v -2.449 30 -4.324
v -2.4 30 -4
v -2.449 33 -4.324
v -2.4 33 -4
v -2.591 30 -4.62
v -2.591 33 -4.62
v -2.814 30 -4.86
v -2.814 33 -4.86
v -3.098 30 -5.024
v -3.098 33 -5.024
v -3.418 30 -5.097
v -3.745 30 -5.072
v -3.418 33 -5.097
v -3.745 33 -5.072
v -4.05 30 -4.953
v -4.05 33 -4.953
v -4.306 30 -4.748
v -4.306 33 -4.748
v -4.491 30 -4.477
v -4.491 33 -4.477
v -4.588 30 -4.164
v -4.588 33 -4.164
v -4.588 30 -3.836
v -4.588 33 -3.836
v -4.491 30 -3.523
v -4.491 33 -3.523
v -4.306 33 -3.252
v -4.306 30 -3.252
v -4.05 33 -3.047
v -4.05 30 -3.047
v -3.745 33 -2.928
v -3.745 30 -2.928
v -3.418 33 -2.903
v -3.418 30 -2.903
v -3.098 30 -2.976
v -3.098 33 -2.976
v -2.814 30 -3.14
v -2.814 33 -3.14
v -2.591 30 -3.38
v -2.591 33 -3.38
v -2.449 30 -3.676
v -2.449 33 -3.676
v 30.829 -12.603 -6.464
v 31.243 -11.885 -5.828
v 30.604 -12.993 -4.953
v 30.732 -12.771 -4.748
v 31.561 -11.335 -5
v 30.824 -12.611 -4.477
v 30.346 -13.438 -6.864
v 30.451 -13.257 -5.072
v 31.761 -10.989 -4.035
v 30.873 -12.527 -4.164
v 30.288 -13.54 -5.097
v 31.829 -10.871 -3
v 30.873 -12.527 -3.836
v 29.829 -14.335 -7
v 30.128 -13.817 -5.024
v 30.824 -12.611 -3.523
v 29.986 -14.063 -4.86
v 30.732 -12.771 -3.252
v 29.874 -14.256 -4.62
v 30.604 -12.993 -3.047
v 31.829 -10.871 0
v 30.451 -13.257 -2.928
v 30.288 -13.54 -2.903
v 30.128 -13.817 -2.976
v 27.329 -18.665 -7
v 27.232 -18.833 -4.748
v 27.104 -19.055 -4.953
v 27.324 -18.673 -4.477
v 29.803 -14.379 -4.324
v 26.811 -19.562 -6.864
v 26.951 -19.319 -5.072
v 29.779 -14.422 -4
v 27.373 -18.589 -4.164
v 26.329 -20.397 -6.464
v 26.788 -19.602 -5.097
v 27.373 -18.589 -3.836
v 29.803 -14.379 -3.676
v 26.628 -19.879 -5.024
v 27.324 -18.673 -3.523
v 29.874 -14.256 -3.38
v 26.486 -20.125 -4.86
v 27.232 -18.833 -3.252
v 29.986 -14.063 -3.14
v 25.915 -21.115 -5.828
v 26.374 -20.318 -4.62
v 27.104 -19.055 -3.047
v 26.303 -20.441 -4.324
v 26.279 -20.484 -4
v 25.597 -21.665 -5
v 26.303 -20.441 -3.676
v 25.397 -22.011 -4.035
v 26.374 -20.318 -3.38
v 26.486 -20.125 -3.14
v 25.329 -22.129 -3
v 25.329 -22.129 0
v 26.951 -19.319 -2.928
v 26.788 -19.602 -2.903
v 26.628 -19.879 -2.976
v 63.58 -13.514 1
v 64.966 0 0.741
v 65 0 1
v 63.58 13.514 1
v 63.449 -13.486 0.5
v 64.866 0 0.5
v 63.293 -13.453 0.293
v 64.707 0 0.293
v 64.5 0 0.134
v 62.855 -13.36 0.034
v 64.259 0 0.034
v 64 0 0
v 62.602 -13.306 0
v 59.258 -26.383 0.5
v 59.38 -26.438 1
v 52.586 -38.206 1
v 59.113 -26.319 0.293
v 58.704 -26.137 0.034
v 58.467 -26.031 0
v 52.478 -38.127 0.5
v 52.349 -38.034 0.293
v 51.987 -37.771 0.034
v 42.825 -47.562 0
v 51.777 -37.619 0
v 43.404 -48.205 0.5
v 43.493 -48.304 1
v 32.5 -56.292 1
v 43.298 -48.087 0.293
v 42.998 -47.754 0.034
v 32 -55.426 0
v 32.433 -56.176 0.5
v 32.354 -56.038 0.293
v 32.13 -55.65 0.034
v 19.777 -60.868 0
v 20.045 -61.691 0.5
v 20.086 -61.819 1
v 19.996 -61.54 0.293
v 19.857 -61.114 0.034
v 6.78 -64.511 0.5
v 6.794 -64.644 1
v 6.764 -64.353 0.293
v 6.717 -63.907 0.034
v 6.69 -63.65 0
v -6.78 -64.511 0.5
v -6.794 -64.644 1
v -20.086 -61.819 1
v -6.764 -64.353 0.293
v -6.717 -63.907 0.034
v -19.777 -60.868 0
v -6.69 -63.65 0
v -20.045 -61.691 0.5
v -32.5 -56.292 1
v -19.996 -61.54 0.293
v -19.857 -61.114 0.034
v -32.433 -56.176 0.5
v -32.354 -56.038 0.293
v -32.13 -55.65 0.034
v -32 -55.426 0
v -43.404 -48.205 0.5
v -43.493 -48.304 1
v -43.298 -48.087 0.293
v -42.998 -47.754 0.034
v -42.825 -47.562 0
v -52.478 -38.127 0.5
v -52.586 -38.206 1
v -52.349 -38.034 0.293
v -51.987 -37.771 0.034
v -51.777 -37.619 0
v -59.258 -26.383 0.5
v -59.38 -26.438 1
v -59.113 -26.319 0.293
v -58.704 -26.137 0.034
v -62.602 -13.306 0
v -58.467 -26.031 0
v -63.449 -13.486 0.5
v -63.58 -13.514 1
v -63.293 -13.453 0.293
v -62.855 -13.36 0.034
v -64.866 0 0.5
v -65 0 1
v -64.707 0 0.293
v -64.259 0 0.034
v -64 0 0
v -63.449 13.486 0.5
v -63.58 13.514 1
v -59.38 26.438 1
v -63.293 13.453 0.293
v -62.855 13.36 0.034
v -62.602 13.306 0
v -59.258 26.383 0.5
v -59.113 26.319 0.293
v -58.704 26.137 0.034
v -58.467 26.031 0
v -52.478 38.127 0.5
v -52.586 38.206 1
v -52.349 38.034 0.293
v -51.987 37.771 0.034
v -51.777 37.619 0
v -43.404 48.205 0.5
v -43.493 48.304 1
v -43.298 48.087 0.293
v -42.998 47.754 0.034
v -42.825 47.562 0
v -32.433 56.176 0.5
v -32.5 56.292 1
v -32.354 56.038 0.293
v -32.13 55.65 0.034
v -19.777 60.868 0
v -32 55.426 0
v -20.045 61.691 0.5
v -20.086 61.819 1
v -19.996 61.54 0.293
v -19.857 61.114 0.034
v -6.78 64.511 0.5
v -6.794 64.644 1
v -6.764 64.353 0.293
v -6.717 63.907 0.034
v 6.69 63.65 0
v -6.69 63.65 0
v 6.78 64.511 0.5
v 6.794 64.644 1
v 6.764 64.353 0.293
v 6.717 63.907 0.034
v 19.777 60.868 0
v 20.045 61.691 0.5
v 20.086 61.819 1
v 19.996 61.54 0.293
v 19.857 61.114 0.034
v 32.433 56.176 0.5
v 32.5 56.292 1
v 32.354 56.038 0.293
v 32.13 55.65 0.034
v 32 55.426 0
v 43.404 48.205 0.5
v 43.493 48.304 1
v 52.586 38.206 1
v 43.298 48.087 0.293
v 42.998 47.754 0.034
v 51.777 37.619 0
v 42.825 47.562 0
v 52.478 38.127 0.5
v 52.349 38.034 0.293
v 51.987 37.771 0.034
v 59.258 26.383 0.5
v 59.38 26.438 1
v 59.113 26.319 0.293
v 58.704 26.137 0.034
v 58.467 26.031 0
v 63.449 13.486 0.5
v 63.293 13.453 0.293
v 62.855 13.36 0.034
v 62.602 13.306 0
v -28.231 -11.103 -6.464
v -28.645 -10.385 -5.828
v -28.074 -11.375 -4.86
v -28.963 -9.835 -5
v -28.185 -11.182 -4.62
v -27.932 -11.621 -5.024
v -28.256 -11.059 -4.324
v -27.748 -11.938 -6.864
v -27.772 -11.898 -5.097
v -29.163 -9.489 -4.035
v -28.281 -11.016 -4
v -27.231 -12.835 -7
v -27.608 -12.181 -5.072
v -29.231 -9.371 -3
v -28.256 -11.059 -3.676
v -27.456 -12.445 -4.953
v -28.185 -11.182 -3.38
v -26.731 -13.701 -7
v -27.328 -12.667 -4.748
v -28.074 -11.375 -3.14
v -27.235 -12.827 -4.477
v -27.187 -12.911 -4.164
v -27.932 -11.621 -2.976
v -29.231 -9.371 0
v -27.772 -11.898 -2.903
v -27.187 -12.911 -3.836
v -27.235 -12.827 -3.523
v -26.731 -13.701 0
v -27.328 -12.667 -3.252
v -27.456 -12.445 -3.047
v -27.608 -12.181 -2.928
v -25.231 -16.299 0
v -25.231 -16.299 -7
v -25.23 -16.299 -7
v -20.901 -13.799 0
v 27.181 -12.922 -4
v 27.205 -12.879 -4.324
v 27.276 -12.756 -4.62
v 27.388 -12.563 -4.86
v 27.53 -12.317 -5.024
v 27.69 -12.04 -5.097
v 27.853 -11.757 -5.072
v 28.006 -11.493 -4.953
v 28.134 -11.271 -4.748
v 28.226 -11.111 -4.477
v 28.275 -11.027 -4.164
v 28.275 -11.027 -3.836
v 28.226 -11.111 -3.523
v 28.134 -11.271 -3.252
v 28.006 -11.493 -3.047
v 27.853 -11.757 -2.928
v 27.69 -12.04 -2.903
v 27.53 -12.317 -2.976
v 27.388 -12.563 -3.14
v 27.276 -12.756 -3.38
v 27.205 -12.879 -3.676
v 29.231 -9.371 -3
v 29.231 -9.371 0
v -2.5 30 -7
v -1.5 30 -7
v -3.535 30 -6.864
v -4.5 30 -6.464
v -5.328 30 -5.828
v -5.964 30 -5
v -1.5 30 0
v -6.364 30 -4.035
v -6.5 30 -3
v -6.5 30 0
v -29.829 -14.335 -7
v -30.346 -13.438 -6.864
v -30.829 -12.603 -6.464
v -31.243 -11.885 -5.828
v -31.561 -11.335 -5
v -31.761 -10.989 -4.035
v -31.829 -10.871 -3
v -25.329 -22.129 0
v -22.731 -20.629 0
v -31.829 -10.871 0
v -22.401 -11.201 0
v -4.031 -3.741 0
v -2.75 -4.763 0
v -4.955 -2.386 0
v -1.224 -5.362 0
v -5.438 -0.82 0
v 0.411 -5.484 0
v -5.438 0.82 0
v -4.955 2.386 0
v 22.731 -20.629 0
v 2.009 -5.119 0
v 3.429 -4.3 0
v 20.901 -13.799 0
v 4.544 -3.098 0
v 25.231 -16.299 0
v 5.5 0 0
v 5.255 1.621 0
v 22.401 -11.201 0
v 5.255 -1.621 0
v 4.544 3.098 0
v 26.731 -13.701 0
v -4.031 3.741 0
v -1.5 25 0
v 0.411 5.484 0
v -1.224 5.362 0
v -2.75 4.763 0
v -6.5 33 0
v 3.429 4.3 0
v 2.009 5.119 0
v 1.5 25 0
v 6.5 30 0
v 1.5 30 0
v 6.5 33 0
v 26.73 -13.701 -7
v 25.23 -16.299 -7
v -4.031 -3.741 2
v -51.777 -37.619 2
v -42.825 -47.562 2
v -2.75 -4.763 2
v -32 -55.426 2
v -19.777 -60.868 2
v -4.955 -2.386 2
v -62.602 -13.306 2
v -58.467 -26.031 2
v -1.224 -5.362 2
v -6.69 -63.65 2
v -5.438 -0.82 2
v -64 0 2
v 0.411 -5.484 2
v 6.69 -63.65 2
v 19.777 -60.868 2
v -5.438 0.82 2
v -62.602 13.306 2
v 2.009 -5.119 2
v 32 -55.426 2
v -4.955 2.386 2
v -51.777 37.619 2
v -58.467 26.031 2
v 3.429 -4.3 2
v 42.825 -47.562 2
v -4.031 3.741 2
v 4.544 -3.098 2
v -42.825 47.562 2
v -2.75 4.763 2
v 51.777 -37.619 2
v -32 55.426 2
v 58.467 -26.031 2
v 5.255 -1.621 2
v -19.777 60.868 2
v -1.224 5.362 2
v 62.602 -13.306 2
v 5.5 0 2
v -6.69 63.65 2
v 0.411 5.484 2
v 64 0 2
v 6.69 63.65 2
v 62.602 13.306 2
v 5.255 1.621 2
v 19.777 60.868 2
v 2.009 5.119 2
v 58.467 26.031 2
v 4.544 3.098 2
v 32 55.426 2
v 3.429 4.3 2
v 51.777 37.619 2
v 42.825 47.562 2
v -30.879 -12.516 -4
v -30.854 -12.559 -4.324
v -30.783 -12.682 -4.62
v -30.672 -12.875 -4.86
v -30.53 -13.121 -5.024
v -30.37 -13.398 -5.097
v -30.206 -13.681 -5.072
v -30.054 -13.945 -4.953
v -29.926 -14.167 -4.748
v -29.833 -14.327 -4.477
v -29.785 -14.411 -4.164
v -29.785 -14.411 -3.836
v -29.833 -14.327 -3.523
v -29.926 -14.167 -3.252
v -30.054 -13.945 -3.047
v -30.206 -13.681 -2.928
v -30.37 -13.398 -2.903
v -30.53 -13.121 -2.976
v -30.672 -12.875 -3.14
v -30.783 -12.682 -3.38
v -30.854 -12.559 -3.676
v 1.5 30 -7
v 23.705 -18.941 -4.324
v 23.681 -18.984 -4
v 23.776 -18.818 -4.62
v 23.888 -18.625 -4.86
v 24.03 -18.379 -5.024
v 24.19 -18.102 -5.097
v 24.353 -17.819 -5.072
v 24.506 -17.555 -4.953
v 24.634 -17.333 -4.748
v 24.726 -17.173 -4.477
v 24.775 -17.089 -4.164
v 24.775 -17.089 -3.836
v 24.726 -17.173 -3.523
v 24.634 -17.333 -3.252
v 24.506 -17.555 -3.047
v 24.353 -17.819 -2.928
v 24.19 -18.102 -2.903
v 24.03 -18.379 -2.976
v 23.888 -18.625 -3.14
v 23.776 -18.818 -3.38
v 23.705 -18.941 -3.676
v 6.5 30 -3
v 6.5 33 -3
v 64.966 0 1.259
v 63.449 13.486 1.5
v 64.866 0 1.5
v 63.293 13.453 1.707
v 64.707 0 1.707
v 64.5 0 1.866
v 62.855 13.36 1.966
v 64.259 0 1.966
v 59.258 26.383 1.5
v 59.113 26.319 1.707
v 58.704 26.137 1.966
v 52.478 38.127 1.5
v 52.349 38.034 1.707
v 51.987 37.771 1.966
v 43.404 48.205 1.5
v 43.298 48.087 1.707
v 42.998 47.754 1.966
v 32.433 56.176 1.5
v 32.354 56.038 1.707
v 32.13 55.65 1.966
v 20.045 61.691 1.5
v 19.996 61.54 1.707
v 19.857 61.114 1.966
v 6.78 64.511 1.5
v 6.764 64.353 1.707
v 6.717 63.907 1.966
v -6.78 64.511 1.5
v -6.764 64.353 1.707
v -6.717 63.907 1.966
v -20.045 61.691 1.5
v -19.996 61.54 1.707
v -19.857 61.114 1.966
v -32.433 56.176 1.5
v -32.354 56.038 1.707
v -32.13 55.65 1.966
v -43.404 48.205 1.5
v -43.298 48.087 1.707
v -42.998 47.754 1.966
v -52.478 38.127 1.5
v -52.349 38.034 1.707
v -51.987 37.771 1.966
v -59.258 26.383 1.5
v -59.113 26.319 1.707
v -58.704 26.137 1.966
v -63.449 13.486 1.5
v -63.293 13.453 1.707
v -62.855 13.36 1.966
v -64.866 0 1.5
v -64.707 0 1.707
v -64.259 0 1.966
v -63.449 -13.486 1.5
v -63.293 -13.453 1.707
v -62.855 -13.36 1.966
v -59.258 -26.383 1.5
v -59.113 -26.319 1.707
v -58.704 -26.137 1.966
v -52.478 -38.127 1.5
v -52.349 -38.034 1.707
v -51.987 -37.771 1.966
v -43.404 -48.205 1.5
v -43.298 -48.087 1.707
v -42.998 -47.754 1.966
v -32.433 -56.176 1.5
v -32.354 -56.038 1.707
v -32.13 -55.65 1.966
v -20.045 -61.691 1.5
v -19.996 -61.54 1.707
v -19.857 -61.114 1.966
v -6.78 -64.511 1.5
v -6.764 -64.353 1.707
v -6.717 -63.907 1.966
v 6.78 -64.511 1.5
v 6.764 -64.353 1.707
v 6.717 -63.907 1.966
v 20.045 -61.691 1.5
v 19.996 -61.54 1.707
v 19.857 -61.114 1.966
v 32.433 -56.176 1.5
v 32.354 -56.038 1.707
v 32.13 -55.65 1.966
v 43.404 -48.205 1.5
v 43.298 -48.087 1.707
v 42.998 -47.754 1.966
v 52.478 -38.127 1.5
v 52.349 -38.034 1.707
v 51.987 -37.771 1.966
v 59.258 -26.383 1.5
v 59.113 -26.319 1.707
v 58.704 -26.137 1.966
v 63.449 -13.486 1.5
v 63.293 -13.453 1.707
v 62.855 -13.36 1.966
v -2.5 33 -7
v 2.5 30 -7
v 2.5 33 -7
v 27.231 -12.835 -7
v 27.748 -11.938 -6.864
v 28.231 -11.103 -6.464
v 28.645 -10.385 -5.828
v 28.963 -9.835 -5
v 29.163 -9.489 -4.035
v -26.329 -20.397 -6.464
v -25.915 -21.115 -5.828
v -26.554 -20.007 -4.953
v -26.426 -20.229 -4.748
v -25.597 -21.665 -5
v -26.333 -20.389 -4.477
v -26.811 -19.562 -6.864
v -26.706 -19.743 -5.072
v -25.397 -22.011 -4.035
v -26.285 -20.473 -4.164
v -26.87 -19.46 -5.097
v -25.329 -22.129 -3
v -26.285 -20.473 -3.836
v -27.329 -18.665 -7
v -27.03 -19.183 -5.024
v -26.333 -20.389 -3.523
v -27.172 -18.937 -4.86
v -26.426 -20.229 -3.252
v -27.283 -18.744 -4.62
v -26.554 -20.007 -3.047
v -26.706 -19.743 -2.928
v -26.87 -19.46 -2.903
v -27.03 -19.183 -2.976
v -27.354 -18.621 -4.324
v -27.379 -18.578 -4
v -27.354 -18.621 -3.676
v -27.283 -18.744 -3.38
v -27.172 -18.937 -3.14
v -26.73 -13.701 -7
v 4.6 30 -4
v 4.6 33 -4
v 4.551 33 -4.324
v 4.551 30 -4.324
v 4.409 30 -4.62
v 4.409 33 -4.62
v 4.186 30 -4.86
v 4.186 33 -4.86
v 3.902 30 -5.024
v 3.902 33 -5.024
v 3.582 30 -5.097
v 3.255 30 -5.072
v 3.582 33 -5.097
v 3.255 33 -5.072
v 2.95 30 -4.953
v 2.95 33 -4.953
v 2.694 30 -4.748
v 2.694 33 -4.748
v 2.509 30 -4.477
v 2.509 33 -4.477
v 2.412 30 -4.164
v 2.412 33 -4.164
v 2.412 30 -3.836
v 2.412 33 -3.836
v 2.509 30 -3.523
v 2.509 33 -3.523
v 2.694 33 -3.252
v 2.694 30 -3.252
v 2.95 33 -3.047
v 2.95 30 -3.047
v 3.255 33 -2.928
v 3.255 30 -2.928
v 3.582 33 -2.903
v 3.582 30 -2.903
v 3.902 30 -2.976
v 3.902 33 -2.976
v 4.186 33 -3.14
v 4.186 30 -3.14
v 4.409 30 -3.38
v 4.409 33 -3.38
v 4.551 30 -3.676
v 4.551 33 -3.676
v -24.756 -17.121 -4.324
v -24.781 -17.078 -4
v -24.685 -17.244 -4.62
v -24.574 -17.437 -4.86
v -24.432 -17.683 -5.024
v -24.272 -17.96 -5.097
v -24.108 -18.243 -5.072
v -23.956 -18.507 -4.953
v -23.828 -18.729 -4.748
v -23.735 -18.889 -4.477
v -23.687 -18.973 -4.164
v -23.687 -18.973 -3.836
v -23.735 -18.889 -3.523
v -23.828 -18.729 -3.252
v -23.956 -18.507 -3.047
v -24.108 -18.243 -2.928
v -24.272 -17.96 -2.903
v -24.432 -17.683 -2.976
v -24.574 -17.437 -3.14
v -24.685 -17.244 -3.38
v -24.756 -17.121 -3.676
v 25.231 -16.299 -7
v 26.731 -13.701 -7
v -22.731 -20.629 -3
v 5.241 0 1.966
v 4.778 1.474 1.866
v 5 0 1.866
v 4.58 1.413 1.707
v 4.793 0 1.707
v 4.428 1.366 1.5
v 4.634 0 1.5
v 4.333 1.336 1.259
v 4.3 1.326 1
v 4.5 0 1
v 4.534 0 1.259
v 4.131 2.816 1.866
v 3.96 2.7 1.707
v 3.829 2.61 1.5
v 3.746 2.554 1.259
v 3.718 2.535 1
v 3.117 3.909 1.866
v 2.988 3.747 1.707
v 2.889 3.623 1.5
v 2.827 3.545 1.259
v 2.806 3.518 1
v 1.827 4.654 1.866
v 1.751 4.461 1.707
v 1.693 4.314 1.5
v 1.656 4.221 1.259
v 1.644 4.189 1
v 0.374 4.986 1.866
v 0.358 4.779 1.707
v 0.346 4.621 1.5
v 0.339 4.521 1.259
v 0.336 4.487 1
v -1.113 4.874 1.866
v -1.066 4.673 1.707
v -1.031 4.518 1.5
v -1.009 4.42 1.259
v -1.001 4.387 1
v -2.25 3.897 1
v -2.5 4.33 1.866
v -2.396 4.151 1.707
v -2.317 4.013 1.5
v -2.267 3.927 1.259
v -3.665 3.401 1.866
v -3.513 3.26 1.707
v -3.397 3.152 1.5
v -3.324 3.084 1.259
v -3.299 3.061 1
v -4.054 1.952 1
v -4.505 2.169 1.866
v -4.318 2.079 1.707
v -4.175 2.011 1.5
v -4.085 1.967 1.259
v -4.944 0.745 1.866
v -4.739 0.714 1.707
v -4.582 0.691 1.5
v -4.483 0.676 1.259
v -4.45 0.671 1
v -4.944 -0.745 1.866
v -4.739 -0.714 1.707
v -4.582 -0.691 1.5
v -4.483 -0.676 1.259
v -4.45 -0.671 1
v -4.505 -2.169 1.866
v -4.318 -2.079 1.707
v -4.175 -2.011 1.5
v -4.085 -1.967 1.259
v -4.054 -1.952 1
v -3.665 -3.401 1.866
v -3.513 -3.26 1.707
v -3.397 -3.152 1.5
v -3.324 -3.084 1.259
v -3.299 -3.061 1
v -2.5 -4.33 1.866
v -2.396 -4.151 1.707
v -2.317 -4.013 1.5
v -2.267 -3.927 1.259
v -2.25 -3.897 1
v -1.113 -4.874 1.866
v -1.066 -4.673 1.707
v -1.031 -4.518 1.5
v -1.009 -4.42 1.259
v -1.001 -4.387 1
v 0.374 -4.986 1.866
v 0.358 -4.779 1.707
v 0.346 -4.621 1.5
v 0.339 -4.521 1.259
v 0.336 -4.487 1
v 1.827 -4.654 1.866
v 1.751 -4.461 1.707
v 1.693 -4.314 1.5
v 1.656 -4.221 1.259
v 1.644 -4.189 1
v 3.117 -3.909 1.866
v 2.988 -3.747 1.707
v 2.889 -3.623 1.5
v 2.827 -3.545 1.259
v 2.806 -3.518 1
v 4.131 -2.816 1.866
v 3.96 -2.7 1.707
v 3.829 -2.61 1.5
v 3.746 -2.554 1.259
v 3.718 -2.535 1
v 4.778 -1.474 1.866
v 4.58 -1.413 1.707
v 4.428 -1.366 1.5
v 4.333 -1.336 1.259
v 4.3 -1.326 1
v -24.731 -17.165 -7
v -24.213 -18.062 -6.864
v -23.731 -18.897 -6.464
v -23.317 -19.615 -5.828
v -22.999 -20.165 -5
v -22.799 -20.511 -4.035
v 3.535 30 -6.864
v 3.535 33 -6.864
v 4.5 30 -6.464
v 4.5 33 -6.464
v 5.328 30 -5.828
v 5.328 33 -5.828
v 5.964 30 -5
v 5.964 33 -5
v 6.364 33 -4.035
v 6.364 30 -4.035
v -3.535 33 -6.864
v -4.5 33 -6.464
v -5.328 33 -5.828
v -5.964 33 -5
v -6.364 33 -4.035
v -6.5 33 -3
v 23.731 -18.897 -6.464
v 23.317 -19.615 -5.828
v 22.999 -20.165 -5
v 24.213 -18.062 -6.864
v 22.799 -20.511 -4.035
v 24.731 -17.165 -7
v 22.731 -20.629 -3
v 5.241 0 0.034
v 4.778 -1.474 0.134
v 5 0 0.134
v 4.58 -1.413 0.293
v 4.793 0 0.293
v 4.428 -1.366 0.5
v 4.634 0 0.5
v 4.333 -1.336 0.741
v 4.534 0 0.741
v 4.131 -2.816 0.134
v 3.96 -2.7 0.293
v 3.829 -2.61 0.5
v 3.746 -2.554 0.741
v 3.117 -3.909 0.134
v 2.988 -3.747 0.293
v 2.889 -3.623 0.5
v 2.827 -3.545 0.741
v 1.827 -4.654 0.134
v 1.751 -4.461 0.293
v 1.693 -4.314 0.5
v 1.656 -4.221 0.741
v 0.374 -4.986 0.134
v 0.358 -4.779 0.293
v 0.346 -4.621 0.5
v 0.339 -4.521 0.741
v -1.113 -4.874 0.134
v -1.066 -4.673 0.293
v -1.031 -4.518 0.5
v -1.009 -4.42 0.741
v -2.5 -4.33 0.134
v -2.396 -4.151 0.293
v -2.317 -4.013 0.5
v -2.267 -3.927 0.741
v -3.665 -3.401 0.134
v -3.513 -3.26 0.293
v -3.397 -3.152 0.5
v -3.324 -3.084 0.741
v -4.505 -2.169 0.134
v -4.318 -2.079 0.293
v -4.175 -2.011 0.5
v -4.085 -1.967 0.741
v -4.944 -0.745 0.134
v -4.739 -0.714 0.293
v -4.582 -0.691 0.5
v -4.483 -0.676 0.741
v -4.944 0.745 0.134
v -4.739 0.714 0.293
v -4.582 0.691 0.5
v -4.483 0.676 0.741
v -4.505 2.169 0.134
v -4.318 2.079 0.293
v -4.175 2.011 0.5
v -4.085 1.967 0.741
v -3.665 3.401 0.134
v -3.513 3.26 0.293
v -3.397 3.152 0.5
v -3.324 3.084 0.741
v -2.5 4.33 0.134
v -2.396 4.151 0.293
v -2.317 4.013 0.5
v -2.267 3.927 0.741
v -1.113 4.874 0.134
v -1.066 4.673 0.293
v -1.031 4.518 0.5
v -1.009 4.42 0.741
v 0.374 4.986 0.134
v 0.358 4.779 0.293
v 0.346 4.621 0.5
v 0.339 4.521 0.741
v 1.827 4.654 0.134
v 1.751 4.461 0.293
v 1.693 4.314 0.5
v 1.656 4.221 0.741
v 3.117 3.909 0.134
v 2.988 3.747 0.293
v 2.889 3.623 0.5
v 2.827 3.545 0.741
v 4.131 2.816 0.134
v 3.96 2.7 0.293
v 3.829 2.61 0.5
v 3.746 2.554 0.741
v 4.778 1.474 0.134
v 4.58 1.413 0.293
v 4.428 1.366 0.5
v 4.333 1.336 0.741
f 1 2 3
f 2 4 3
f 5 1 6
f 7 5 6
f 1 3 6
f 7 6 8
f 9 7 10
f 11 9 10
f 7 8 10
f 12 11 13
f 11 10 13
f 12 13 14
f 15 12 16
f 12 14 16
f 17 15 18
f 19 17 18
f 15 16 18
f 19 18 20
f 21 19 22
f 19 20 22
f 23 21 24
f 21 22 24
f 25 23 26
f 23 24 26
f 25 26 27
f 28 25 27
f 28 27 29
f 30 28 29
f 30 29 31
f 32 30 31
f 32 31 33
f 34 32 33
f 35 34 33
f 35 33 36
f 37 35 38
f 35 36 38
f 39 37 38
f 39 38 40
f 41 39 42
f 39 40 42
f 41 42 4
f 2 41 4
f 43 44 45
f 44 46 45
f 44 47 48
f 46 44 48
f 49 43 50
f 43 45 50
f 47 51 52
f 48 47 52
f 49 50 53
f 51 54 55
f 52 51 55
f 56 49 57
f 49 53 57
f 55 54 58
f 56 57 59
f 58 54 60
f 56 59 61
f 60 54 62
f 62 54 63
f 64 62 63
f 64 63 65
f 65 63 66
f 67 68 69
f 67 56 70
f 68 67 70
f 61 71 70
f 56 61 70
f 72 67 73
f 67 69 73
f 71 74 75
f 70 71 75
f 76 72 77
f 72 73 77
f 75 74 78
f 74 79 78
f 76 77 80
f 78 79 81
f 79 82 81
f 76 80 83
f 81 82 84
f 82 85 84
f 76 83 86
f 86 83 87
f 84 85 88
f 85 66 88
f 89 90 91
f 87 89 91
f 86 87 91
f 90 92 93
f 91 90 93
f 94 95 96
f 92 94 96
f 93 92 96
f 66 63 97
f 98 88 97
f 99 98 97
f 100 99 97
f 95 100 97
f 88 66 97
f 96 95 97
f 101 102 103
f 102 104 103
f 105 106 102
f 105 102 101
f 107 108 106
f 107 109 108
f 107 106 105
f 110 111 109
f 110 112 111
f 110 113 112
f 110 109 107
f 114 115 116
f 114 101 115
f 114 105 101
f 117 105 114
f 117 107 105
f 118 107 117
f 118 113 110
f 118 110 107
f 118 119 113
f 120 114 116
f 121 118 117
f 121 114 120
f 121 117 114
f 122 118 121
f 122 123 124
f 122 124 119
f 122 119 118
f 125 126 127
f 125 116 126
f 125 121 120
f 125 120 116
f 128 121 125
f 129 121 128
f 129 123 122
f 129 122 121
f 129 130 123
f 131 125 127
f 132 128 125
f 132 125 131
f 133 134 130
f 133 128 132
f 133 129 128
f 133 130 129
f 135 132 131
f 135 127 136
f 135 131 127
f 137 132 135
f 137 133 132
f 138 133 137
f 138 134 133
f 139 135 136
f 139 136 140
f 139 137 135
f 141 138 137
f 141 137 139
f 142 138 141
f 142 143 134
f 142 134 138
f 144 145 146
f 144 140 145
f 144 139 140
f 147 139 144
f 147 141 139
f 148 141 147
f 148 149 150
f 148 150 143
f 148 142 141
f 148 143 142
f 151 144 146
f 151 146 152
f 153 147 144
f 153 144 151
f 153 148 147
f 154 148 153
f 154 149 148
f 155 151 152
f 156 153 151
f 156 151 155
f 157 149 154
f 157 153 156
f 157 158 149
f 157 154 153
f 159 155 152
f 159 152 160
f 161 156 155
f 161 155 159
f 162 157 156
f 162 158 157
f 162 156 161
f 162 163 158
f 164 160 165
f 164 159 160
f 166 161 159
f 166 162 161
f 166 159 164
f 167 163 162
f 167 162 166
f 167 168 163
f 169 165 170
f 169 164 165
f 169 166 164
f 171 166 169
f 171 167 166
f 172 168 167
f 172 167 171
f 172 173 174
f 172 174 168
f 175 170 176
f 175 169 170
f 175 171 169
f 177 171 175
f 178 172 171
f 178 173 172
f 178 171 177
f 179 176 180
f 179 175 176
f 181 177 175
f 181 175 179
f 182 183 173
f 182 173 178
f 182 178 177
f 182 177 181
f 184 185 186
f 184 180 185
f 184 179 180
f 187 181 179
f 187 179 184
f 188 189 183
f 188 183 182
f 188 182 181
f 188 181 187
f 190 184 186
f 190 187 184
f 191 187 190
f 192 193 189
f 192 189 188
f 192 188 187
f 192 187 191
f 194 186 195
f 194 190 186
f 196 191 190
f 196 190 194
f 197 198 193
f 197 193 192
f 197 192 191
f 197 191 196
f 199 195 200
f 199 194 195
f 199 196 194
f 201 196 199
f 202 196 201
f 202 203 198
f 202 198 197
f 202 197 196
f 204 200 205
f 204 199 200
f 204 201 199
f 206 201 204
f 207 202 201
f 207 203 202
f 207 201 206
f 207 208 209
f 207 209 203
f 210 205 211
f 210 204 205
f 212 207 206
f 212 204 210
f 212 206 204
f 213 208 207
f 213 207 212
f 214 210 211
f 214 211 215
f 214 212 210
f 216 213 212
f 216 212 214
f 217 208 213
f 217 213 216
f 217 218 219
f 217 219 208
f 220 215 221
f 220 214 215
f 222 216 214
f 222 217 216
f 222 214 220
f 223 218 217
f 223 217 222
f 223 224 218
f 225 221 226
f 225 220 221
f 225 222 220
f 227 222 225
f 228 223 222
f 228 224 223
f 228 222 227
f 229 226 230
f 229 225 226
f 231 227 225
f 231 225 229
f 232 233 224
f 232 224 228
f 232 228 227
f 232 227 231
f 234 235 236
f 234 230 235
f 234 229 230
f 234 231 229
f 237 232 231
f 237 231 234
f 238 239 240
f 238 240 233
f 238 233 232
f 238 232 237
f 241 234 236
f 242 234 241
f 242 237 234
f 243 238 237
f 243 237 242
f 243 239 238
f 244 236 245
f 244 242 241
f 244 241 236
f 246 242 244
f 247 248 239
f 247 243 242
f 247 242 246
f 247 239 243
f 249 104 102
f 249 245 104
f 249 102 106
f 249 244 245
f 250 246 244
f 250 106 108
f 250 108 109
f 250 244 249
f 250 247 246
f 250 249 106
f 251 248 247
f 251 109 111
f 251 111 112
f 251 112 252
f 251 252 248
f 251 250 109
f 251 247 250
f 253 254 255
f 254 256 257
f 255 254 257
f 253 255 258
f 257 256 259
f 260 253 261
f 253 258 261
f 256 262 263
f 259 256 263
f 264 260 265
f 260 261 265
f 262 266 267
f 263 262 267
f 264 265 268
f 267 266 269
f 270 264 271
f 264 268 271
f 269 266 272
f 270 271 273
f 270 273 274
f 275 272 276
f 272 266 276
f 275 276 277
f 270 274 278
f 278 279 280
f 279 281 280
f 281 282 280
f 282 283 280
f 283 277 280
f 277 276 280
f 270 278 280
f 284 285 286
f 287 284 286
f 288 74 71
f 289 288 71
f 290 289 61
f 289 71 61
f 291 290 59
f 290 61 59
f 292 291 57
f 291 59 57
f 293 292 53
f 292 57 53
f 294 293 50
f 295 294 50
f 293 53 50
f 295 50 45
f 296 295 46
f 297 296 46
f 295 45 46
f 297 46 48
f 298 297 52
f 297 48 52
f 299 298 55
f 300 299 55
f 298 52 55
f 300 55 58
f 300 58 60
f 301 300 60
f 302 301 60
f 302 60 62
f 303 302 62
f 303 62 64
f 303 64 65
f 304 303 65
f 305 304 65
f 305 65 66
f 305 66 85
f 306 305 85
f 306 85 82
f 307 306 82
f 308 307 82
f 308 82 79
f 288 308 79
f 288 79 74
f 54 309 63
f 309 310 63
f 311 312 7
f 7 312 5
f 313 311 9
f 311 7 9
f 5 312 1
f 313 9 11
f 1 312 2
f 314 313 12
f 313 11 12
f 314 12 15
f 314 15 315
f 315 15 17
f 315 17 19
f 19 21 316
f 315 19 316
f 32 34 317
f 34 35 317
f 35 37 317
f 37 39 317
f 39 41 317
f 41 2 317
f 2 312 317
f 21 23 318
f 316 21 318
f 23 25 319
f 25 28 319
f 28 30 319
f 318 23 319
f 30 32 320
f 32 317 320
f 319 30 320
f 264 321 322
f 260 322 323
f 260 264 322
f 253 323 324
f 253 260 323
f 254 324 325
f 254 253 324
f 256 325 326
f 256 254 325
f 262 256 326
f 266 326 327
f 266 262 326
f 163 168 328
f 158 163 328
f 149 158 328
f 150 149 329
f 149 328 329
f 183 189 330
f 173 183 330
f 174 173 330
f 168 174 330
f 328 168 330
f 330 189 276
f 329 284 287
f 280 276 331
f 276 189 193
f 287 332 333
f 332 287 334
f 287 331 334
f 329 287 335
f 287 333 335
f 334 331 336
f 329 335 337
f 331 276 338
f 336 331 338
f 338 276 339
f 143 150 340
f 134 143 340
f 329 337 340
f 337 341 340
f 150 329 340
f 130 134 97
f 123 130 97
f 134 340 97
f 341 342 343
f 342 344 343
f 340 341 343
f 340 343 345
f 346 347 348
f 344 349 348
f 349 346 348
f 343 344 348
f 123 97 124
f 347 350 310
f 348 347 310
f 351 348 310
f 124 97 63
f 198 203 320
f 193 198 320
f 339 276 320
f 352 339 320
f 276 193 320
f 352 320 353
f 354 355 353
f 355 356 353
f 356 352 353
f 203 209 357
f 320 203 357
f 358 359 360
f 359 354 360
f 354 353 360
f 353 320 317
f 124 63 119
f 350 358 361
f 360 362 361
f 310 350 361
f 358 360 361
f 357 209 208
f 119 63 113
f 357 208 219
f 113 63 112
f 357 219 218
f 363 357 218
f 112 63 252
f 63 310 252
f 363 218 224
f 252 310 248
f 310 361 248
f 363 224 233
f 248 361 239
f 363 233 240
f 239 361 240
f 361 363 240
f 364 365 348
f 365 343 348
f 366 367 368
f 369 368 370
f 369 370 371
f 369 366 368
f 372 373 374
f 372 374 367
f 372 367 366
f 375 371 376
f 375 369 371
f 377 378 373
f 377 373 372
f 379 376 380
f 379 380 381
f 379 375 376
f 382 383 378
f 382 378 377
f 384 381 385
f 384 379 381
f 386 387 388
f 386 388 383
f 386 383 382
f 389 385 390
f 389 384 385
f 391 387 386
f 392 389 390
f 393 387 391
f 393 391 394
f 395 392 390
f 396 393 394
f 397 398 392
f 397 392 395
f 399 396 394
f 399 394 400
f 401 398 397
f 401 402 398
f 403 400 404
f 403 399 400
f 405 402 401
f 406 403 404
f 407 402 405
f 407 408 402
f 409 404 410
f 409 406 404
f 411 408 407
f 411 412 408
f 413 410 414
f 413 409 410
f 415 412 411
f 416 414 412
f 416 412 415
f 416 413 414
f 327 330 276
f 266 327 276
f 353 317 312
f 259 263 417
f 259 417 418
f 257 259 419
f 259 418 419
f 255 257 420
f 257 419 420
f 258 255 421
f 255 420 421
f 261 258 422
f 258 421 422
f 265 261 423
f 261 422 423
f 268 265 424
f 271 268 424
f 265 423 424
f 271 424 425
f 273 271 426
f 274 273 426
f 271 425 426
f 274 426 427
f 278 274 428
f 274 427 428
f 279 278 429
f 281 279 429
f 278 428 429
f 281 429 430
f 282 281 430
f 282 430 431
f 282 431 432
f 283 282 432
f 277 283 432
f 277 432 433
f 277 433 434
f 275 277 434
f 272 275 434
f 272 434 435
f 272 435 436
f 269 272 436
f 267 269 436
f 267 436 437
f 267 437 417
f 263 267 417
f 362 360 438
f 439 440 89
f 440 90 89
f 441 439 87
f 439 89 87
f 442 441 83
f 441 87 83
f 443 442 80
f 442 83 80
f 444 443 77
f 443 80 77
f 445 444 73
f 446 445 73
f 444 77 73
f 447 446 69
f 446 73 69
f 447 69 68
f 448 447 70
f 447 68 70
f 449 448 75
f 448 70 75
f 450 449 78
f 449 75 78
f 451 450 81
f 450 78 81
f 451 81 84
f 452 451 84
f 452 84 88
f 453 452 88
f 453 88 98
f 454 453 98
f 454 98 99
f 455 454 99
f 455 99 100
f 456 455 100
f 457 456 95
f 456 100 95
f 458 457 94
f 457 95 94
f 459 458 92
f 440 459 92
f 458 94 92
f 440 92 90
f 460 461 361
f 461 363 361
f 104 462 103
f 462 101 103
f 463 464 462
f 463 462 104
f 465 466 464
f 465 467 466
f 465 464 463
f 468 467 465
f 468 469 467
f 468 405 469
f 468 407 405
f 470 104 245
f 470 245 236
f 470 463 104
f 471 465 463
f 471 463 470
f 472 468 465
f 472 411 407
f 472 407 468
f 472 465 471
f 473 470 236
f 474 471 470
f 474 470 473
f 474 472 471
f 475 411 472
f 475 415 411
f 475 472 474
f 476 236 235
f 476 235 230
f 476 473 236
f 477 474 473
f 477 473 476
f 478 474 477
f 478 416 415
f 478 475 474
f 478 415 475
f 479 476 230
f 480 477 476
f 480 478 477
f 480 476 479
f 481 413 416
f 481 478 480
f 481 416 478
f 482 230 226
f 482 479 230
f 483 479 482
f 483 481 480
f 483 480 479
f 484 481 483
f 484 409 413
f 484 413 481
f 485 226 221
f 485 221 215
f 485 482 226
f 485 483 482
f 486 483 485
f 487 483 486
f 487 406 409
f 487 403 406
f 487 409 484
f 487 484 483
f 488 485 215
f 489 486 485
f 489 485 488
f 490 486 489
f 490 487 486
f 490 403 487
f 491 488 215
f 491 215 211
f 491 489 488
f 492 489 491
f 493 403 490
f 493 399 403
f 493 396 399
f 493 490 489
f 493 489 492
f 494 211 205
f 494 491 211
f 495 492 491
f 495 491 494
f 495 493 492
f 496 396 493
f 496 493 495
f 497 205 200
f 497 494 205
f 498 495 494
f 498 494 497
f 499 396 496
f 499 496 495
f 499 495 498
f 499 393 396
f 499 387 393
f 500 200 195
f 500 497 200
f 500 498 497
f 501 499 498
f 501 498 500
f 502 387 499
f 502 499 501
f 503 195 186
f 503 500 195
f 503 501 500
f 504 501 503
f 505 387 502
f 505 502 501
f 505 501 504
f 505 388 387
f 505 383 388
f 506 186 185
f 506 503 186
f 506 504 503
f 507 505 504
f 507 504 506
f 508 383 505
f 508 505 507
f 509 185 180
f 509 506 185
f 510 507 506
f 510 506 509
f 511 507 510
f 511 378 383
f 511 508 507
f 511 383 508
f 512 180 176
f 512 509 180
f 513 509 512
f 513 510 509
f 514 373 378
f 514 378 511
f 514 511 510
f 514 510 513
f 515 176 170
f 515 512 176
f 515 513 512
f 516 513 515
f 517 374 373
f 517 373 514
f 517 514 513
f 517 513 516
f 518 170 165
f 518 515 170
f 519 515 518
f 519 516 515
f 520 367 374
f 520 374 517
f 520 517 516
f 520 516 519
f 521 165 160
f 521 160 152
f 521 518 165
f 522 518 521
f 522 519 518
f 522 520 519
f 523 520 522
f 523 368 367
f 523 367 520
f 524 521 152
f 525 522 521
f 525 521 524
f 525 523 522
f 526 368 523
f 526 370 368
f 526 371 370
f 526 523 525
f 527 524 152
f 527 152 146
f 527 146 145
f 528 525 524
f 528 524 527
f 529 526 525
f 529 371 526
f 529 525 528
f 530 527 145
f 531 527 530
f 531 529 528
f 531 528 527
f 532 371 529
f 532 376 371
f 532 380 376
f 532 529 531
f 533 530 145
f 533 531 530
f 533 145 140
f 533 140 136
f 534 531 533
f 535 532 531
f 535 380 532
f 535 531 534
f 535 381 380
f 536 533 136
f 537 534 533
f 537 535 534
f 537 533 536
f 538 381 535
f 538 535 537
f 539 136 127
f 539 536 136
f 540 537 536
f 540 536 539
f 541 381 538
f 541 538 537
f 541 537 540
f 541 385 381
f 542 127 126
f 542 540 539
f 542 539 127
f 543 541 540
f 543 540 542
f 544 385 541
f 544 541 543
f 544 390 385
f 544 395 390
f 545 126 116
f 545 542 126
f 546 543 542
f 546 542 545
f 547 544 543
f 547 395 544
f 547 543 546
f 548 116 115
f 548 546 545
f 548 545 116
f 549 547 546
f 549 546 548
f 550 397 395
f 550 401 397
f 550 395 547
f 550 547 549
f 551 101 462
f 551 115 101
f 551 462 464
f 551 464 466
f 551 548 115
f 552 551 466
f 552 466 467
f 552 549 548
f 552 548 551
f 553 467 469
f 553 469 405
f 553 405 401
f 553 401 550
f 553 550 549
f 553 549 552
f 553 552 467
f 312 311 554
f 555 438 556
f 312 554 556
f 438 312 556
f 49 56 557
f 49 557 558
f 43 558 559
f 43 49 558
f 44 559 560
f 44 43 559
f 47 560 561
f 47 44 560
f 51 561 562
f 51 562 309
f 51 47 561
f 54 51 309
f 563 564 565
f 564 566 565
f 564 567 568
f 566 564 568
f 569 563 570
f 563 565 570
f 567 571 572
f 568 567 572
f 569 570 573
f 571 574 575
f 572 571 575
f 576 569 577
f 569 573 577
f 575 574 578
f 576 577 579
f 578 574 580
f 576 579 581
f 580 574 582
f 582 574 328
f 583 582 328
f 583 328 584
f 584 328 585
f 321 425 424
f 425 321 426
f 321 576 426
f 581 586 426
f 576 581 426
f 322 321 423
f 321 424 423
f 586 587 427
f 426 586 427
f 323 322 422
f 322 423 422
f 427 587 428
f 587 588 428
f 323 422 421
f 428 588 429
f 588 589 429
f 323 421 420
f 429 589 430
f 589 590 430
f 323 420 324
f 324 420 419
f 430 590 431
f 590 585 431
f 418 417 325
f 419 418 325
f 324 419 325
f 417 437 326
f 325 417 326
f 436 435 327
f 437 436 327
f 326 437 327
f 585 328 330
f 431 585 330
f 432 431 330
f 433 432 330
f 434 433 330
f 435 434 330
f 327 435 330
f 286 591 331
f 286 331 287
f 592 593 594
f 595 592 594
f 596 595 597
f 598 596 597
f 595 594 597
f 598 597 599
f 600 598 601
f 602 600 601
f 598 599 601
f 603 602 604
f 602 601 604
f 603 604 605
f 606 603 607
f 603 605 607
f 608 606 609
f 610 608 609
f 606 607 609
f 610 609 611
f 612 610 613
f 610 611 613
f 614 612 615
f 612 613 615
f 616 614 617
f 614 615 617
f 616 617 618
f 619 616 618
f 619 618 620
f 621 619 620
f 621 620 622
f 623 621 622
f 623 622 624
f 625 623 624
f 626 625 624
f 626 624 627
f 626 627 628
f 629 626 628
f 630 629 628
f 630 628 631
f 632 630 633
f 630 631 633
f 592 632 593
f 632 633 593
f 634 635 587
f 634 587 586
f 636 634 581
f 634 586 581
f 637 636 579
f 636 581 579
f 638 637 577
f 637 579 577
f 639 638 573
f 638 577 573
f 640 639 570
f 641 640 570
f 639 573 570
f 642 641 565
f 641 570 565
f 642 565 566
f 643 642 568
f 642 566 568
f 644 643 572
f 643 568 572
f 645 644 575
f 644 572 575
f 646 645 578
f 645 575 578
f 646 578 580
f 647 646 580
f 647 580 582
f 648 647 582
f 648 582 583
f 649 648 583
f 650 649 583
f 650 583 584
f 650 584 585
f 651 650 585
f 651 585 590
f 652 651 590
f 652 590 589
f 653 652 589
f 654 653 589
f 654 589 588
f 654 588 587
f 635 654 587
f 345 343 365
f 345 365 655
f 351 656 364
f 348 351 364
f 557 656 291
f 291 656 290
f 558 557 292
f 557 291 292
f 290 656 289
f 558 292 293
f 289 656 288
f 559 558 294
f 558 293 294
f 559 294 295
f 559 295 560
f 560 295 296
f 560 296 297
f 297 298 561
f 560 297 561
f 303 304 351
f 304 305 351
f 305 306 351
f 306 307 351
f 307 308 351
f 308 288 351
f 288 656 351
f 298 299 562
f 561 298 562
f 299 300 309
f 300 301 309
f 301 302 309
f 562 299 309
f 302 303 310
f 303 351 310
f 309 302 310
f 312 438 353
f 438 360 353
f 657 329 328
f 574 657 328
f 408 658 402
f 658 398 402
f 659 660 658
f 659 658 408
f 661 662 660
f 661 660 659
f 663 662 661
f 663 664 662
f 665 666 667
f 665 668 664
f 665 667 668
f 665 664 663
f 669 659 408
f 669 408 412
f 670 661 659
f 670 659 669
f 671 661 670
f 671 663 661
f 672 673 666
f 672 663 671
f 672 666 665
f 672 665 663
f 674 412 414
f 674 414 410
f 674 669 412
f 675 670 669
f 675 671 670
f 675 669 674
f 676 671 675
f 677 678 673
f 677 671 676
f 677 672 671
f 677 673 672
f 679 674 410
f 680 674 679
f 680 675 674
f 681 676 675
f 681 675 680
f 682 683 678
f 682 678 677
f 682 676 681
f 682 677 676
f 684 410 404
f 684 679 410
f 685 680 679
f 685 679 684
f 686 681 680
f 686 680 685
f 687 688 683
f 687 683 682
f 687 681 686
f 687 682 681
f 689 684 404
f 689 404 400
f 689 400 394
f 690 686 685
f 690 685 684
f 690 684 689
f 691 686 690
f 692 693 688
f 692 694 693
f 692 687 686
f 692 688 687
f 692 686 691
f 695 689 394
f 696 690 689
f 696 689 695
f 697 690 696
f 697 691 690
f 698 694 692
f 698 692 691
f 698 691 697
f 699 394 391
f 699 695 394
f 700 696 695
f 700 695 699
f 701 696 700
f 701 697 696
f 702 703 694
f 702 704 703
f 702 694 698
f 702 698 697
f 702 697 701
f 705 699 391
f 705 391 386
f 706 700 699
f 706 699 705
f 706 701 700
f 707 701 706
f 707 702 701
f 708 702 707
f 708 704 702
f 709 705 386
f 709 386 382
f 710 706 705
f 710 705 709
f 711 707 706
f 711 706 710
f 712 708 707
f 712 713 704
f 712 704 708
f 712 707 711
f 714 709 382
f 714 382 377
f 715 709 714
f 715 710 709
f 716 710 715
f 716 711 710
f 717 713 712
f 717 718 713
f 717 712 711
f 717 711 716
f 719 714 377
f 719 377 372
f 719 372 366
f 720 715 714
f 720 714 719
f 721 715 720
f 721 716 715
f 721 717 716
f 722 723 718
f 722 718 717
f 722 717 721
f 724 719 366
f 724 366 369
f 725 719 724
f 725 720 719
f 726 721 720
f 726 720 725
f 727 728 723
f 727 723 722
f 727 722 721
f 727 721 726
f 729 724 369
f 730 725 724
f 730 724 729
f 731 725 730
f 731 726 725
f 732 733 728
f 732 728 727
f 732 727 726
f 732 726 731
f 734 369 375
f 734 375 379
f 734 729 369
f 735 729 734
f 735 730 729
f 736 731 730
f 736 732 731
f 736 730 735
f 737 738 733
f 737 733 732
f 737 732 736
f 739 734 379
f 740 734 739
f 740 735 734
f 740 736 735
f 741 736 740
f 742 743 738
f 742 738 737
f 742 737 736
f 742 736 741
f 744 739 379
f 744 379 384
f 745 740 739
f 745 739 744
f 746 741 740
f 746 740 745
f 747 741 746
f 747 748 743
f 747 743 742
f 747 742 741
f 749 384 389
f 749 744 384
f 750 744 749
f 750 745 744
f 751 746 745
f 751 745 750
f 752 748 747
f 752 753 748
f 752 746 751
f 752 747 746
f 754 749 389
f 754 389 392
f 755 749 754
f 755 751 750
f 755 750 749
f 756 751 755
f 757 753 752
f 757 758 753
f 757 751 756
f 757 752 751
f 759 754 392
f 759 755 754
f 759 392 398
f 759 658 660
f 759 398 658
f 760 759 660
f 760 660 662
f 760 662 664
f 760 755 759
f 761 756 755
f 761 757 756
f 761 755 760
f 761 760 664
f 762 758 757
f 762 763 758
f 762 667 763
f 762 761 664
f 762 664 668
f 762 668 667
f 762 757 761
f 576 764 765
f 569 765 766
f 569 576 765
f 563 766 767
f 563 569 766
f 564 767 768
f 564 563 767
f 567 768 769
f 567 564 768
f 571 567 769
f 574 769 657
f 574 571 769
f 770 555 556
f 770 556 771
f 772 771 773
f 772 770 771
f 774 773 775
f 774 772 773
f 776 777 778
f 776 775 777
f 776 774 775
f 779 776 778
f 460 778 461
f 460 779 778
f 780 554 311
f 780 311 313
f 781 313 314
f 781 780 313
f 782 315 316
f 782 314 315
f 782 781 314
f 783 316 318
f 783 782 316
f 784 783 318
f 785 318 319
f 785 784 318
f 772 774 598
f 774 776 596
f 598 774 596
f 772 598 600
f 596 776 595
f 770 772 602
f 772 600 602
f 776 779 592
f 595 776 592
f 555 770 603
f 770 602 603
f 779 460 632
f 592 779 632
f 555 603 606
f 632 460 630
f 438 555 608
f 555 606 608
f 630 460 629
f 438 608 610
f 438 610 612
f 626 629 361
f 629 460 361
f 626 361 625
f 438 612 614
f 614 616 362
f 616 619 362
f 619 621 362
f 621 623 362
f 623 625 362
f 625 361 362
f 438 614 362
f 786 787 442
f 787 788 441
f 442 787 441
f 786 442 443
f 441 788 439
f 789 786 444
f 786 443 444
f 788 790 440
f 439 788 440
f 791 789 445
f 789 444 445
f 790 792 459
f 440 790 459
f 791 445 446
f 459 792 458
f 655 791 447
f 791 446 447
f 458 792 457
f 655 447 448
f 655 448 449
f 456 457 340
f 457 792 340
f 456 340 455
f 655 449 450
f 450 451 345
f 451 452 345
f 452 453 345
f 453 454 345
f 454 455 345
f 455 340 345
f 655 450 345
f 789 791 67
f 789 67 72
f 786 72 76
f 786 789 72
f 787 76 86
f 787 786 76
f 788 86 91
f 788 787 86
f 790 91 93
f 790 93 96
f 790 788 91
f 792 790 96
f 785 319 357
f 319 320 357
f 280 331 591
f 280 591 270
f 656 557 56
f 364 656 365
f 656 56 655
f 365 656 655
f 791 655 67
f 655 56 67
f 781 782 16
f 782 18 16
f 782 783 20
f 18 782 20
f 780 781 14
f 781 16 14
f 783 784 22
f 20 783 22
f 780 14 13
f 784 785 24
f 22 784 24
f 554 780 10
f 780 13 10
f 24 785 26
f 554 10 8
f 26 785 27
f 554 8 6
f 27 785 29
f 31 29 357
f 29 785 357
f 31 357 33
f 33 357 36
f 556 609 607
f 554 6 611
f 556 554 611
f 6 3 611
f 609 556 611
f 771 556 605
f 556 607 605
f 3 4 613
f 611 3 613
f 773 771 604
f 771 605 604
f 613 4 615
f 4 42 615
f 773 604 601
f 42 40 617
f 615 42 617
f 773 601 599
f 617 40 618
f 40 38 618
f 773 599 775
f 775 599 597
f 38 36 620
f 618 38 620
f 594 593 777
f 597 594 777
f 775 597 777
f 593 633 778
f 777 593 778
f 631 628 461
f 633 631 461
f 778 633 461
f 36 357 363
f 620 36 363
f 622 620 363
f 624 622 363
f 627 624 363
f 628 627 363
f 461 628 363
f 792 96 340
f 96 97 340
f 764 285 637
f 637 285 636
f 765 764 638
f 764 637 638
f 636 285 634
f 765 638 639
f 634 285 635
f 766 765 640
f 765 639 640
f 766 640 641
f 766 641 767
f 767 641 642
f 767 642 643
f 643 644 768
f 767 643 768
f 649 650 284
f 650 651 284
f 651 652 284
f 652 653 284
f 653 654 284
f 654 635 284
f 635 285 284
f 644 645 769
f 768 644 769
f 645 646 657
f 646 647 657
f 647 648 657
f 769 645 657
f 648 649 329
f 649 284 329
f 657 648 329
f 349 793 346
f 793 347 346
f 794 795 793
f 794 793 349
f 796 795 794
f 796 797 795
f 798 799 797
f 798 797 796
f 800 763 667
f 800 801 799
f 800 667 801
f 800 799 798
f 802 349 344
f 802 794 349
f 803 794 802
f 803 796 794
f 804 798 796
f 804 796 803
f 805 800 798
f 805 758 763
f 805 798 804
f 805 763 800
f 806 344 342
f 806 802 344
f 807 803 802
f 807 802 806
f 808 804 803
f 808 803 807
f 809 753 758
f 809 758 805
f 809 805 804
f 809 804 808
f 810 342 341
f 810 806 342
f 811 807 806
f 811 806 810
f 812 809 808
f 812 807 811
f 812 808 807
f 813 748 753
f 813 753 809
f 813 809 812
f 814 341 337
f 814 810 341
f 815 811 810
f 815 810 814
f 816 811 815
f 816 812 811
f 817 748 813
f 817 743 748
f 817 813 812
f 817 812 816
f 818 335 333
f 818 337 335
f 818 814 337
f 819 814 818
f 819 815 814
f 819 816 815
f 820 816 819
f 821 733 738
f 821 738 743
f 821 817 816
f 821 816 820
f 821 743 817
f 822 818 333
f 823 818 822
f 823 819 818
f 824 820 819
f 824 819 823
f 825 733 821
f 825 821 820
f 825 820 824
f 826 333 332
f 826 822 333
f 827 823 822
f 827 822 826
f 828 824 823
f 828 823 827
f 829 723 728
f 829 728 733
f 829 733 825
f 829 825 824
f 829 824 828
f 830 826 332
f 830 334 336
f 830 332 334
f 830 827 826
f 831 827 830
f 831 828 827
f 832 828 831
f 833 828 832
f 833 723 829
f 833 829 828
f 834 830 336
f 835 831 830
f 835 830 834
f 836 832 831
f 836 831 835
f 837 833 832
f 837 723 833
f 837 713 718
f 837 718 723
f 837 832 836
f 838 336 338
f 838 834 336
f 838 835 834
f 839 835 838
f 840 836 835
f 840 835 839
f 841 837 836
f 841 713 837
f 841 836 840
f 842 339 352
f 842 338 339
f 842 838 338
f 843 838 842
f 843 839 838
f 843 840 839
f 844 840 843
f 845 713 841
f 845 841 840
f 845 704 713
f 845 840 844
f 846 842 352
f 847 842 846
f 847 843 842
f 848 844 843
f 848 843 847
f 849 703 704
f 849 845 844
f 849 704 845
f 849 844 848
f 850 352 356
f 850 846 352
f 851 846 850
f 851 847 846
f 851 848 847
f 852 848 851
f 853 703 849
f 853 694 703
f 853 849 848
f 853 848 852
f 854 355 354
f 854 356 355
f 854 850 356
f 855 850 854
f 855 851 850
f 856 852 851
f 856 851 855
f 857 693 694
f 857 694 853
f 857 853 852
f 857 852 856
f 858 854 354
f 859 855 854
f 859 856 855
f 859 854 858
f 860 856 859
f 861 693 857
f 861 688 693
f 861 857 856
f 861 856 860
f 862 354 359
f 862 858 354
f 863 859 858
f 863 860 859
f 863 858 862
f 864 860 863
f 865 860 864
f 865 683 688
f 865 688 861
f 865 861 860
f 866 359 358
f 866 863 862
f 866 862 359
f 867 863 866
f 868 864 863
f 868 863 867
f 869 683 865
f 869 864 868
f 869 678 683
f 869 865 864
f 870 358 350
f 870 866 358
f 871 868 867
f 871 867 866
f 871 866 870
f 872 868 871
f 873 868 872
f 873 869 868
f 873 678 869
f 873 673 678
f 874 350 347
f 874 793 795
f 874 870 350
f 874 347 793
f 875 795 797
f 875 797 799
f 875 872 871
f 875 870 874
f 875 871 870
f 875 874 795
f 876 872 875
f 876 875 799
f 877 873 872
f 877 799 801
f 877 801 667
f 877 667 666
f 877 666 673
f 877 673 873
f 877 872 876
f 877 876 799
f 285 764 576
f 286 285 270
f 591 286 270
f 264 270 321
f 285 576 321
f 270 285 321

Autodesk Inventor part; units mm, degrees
ref_plane "YZ Plane" through (0, 0, 0) normal (1, 0, 0) x (0, 1, 0)
ref_plane "XZ Plane" through (0, 0, 0) normal (0, 1, 0) x (-1, 0, 0)
ref_plane "XY Plane" through (0, 0, 0) normal (0, 0, 1) x (1, 0, 0)
sketch "Skizze1" plane through (0, 0, 0) normal (0, 0, 1) x (1, 0, 0)
  line L0 (-91, 0) -> (91, 0) construction
  circle A0 centre (0, 0) radius 65
  line L1 (-6.5, 33) -> (6.5, 33)
  line L2 (6.5, 33) -> (6.5, 30)
  line L3 (6.5, 30) -> (-6.5, 30)
  line L4 (-6.5, 30) -> (-6.5, 33)
  line L5 (1.5, 30) -> (-1.5, 30)
  line L6 (-1.5, 30) -> (-1.5, 25)
  line L7 (-1.5, 25) -> (1.5, 25)
  line L8 (1.5, 25) -> (1.5, 30)
  circle A1 centre (0, 0) radius 4.5
  line L9 (0, 91) -> (0, -91) construction
  dimension "d9" = 130
  dimension "d10" = 3
  dimension "d11" = 30
  dimension "d14" = 13
  dimension "d23" = 5
  dimension "d62" = 9
extrude "Extrusion3" add sketch "Skizze1" against normal blind 7 contours L1 L2 L3 L4 | L3 L8 L7 L6
fillet "Rundung1" radius 4 2 edges at (-6.5, 31.5, -7) (6.5, 31.5, -7)
sketch "Skizze2" plane through (-6.5, 33, 0) normal (0, 1, 0) x (1, 0, 0)
  circle A0 centre (3, 4) radius 1.1
  circle A1 centre (10, 4) radius 1.1
  line L0 (6.5, 0) -> (6.5, 7) construction
  line L1 (43, 0) -> (-27, 0) construction
  line L2 (-1.6221, 4) -> (19.0112, 4) construction
  line L3 (4, 7) -> (9, 7) construction
  line L4 (0, 0) -> (0, 3) projected
  dimension "d16" = 2.2
  dimension "d20" = 3
  dimension "d21" = 3
extrude "Extrusion4" cut sketch "Skizze2" against normal up to next
chamfer "Fase1" distance 5 distance2 7 1 edges at (0, 25, -7) measured on face at (0.5, 32, -7)
pattern_circular "Runde Anordnung1" count 3 over 360 about axis through (0, 0, -10) along (0, 0, 1) of "Extrusion3", "Extrusion4", "Fase1", "Rundung1"
extrude "Extrusion11" add sketch "Skizze1" along normal blind 2 contours A0 | L1 L2 L3 L4 | L3 L8 L7 L6
fillet "Rundung5" radius 1 4 edges at (-65, 0, 2) (-4.5, 0, 2) (-4.5, 0, 0) (-65, 0, 0)
equation "\"d21\" = d20"
properties part number "Stewart-Plate-Head"
